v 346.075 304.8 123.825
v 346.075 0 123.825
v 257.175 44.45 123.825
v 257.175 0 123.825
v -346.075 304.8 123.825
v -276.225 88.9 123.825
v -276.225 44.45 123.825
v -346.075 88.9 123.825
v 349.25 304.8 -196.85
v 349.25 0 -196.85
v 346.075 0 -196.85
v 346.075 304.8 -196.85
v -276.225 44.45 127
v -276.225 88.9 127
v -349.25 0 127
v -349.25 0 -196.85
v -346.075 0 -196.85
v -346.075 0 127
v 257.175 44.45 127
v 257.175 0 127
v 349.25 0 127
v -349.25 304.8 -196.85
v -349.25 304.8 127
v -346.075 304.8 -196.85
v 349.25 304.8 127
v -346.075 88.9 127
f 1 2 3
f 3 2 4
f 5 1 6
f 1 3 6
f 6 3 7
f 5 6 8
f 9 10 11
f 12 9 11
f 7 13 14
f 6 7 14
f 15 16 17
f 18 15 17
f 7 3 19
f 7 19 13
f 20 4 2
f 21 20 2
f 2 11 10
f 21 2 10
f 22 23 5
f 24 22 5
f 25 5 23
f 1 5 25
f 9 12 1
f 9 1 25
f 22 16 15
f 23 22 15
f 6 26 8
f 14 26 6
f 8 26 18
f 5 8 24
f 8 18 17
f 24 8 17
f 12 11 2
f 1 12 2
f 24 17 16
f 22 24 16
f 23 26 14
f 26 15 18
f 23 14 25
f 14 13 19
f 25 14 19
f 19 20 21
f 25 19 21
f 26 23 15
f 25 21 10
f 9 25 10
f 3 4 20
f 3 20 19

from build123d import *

# Parameters (mm, degrees)
EXTRUDE_THIN1_DEPTH = 304.8
SKETCH2_W           = 69.85
SKETCH2_H           = 88.9
CUT_EXTRUDE1_DEPTH  = 324.85
SKETCH3_W           = 533.4
SKETCH3_H           = 44.45
CUT_EXTRUDE2_DEPTH  = 4.175


with BuildPart() as part:
    # Sketch1 → Extrude-Thin1 (new body)
    with BuildSketch(Plane(origin=(0, 0, 0), x_dir=(1, 0, 0), z_dir=(0, 1, 0))):
        Polygon((-349.25, 196.85), (-349.25, -127), (-101.6, -127), (292.1, -127), (349.25, -127), (349.25, 196.85), (346.075, 196.85), (346.075, -123.825), (292.1, -123.825), (-101.6, -123.825), (-346.075, -123.825), (-346.075, 196.85), align=None)
    extrude(amount=EXTRUDE_THIN1_DEPTH)

    # Sketch2 → Cut-Extrude1 (cut, through all)
    with BuildSketch(Plane(origin=(-139.504532993, -186.632694872, 127), x_dir=(1, 0, 0), z_dir=(0, 0, 1))):
        with Locations((-171.645467007, 231.082694872)):
            Rectangle(SKETCH2_W, SKETCH2_H)
    extrude(amount=-CUT_EXTRUDE1_DEPTH, mode=Mode.SUBTRACT)

    # Sketch3 → Cut-Extrude2 (cut, through all)
    with BuildSketch(Plane(origin=(0, 0, 123.825), x_dir=(-1, 0, 0), z_dir=(0, 0, -1))):
        with Locations((9.525, 22.225)):
            Rectangle(SKETCH3_W, SKETCH3_H)
    extrude(amount=-CUT_EXTRUDE2_DEPTH, mode=Mode.SUBTRACT)


solid = part.part
